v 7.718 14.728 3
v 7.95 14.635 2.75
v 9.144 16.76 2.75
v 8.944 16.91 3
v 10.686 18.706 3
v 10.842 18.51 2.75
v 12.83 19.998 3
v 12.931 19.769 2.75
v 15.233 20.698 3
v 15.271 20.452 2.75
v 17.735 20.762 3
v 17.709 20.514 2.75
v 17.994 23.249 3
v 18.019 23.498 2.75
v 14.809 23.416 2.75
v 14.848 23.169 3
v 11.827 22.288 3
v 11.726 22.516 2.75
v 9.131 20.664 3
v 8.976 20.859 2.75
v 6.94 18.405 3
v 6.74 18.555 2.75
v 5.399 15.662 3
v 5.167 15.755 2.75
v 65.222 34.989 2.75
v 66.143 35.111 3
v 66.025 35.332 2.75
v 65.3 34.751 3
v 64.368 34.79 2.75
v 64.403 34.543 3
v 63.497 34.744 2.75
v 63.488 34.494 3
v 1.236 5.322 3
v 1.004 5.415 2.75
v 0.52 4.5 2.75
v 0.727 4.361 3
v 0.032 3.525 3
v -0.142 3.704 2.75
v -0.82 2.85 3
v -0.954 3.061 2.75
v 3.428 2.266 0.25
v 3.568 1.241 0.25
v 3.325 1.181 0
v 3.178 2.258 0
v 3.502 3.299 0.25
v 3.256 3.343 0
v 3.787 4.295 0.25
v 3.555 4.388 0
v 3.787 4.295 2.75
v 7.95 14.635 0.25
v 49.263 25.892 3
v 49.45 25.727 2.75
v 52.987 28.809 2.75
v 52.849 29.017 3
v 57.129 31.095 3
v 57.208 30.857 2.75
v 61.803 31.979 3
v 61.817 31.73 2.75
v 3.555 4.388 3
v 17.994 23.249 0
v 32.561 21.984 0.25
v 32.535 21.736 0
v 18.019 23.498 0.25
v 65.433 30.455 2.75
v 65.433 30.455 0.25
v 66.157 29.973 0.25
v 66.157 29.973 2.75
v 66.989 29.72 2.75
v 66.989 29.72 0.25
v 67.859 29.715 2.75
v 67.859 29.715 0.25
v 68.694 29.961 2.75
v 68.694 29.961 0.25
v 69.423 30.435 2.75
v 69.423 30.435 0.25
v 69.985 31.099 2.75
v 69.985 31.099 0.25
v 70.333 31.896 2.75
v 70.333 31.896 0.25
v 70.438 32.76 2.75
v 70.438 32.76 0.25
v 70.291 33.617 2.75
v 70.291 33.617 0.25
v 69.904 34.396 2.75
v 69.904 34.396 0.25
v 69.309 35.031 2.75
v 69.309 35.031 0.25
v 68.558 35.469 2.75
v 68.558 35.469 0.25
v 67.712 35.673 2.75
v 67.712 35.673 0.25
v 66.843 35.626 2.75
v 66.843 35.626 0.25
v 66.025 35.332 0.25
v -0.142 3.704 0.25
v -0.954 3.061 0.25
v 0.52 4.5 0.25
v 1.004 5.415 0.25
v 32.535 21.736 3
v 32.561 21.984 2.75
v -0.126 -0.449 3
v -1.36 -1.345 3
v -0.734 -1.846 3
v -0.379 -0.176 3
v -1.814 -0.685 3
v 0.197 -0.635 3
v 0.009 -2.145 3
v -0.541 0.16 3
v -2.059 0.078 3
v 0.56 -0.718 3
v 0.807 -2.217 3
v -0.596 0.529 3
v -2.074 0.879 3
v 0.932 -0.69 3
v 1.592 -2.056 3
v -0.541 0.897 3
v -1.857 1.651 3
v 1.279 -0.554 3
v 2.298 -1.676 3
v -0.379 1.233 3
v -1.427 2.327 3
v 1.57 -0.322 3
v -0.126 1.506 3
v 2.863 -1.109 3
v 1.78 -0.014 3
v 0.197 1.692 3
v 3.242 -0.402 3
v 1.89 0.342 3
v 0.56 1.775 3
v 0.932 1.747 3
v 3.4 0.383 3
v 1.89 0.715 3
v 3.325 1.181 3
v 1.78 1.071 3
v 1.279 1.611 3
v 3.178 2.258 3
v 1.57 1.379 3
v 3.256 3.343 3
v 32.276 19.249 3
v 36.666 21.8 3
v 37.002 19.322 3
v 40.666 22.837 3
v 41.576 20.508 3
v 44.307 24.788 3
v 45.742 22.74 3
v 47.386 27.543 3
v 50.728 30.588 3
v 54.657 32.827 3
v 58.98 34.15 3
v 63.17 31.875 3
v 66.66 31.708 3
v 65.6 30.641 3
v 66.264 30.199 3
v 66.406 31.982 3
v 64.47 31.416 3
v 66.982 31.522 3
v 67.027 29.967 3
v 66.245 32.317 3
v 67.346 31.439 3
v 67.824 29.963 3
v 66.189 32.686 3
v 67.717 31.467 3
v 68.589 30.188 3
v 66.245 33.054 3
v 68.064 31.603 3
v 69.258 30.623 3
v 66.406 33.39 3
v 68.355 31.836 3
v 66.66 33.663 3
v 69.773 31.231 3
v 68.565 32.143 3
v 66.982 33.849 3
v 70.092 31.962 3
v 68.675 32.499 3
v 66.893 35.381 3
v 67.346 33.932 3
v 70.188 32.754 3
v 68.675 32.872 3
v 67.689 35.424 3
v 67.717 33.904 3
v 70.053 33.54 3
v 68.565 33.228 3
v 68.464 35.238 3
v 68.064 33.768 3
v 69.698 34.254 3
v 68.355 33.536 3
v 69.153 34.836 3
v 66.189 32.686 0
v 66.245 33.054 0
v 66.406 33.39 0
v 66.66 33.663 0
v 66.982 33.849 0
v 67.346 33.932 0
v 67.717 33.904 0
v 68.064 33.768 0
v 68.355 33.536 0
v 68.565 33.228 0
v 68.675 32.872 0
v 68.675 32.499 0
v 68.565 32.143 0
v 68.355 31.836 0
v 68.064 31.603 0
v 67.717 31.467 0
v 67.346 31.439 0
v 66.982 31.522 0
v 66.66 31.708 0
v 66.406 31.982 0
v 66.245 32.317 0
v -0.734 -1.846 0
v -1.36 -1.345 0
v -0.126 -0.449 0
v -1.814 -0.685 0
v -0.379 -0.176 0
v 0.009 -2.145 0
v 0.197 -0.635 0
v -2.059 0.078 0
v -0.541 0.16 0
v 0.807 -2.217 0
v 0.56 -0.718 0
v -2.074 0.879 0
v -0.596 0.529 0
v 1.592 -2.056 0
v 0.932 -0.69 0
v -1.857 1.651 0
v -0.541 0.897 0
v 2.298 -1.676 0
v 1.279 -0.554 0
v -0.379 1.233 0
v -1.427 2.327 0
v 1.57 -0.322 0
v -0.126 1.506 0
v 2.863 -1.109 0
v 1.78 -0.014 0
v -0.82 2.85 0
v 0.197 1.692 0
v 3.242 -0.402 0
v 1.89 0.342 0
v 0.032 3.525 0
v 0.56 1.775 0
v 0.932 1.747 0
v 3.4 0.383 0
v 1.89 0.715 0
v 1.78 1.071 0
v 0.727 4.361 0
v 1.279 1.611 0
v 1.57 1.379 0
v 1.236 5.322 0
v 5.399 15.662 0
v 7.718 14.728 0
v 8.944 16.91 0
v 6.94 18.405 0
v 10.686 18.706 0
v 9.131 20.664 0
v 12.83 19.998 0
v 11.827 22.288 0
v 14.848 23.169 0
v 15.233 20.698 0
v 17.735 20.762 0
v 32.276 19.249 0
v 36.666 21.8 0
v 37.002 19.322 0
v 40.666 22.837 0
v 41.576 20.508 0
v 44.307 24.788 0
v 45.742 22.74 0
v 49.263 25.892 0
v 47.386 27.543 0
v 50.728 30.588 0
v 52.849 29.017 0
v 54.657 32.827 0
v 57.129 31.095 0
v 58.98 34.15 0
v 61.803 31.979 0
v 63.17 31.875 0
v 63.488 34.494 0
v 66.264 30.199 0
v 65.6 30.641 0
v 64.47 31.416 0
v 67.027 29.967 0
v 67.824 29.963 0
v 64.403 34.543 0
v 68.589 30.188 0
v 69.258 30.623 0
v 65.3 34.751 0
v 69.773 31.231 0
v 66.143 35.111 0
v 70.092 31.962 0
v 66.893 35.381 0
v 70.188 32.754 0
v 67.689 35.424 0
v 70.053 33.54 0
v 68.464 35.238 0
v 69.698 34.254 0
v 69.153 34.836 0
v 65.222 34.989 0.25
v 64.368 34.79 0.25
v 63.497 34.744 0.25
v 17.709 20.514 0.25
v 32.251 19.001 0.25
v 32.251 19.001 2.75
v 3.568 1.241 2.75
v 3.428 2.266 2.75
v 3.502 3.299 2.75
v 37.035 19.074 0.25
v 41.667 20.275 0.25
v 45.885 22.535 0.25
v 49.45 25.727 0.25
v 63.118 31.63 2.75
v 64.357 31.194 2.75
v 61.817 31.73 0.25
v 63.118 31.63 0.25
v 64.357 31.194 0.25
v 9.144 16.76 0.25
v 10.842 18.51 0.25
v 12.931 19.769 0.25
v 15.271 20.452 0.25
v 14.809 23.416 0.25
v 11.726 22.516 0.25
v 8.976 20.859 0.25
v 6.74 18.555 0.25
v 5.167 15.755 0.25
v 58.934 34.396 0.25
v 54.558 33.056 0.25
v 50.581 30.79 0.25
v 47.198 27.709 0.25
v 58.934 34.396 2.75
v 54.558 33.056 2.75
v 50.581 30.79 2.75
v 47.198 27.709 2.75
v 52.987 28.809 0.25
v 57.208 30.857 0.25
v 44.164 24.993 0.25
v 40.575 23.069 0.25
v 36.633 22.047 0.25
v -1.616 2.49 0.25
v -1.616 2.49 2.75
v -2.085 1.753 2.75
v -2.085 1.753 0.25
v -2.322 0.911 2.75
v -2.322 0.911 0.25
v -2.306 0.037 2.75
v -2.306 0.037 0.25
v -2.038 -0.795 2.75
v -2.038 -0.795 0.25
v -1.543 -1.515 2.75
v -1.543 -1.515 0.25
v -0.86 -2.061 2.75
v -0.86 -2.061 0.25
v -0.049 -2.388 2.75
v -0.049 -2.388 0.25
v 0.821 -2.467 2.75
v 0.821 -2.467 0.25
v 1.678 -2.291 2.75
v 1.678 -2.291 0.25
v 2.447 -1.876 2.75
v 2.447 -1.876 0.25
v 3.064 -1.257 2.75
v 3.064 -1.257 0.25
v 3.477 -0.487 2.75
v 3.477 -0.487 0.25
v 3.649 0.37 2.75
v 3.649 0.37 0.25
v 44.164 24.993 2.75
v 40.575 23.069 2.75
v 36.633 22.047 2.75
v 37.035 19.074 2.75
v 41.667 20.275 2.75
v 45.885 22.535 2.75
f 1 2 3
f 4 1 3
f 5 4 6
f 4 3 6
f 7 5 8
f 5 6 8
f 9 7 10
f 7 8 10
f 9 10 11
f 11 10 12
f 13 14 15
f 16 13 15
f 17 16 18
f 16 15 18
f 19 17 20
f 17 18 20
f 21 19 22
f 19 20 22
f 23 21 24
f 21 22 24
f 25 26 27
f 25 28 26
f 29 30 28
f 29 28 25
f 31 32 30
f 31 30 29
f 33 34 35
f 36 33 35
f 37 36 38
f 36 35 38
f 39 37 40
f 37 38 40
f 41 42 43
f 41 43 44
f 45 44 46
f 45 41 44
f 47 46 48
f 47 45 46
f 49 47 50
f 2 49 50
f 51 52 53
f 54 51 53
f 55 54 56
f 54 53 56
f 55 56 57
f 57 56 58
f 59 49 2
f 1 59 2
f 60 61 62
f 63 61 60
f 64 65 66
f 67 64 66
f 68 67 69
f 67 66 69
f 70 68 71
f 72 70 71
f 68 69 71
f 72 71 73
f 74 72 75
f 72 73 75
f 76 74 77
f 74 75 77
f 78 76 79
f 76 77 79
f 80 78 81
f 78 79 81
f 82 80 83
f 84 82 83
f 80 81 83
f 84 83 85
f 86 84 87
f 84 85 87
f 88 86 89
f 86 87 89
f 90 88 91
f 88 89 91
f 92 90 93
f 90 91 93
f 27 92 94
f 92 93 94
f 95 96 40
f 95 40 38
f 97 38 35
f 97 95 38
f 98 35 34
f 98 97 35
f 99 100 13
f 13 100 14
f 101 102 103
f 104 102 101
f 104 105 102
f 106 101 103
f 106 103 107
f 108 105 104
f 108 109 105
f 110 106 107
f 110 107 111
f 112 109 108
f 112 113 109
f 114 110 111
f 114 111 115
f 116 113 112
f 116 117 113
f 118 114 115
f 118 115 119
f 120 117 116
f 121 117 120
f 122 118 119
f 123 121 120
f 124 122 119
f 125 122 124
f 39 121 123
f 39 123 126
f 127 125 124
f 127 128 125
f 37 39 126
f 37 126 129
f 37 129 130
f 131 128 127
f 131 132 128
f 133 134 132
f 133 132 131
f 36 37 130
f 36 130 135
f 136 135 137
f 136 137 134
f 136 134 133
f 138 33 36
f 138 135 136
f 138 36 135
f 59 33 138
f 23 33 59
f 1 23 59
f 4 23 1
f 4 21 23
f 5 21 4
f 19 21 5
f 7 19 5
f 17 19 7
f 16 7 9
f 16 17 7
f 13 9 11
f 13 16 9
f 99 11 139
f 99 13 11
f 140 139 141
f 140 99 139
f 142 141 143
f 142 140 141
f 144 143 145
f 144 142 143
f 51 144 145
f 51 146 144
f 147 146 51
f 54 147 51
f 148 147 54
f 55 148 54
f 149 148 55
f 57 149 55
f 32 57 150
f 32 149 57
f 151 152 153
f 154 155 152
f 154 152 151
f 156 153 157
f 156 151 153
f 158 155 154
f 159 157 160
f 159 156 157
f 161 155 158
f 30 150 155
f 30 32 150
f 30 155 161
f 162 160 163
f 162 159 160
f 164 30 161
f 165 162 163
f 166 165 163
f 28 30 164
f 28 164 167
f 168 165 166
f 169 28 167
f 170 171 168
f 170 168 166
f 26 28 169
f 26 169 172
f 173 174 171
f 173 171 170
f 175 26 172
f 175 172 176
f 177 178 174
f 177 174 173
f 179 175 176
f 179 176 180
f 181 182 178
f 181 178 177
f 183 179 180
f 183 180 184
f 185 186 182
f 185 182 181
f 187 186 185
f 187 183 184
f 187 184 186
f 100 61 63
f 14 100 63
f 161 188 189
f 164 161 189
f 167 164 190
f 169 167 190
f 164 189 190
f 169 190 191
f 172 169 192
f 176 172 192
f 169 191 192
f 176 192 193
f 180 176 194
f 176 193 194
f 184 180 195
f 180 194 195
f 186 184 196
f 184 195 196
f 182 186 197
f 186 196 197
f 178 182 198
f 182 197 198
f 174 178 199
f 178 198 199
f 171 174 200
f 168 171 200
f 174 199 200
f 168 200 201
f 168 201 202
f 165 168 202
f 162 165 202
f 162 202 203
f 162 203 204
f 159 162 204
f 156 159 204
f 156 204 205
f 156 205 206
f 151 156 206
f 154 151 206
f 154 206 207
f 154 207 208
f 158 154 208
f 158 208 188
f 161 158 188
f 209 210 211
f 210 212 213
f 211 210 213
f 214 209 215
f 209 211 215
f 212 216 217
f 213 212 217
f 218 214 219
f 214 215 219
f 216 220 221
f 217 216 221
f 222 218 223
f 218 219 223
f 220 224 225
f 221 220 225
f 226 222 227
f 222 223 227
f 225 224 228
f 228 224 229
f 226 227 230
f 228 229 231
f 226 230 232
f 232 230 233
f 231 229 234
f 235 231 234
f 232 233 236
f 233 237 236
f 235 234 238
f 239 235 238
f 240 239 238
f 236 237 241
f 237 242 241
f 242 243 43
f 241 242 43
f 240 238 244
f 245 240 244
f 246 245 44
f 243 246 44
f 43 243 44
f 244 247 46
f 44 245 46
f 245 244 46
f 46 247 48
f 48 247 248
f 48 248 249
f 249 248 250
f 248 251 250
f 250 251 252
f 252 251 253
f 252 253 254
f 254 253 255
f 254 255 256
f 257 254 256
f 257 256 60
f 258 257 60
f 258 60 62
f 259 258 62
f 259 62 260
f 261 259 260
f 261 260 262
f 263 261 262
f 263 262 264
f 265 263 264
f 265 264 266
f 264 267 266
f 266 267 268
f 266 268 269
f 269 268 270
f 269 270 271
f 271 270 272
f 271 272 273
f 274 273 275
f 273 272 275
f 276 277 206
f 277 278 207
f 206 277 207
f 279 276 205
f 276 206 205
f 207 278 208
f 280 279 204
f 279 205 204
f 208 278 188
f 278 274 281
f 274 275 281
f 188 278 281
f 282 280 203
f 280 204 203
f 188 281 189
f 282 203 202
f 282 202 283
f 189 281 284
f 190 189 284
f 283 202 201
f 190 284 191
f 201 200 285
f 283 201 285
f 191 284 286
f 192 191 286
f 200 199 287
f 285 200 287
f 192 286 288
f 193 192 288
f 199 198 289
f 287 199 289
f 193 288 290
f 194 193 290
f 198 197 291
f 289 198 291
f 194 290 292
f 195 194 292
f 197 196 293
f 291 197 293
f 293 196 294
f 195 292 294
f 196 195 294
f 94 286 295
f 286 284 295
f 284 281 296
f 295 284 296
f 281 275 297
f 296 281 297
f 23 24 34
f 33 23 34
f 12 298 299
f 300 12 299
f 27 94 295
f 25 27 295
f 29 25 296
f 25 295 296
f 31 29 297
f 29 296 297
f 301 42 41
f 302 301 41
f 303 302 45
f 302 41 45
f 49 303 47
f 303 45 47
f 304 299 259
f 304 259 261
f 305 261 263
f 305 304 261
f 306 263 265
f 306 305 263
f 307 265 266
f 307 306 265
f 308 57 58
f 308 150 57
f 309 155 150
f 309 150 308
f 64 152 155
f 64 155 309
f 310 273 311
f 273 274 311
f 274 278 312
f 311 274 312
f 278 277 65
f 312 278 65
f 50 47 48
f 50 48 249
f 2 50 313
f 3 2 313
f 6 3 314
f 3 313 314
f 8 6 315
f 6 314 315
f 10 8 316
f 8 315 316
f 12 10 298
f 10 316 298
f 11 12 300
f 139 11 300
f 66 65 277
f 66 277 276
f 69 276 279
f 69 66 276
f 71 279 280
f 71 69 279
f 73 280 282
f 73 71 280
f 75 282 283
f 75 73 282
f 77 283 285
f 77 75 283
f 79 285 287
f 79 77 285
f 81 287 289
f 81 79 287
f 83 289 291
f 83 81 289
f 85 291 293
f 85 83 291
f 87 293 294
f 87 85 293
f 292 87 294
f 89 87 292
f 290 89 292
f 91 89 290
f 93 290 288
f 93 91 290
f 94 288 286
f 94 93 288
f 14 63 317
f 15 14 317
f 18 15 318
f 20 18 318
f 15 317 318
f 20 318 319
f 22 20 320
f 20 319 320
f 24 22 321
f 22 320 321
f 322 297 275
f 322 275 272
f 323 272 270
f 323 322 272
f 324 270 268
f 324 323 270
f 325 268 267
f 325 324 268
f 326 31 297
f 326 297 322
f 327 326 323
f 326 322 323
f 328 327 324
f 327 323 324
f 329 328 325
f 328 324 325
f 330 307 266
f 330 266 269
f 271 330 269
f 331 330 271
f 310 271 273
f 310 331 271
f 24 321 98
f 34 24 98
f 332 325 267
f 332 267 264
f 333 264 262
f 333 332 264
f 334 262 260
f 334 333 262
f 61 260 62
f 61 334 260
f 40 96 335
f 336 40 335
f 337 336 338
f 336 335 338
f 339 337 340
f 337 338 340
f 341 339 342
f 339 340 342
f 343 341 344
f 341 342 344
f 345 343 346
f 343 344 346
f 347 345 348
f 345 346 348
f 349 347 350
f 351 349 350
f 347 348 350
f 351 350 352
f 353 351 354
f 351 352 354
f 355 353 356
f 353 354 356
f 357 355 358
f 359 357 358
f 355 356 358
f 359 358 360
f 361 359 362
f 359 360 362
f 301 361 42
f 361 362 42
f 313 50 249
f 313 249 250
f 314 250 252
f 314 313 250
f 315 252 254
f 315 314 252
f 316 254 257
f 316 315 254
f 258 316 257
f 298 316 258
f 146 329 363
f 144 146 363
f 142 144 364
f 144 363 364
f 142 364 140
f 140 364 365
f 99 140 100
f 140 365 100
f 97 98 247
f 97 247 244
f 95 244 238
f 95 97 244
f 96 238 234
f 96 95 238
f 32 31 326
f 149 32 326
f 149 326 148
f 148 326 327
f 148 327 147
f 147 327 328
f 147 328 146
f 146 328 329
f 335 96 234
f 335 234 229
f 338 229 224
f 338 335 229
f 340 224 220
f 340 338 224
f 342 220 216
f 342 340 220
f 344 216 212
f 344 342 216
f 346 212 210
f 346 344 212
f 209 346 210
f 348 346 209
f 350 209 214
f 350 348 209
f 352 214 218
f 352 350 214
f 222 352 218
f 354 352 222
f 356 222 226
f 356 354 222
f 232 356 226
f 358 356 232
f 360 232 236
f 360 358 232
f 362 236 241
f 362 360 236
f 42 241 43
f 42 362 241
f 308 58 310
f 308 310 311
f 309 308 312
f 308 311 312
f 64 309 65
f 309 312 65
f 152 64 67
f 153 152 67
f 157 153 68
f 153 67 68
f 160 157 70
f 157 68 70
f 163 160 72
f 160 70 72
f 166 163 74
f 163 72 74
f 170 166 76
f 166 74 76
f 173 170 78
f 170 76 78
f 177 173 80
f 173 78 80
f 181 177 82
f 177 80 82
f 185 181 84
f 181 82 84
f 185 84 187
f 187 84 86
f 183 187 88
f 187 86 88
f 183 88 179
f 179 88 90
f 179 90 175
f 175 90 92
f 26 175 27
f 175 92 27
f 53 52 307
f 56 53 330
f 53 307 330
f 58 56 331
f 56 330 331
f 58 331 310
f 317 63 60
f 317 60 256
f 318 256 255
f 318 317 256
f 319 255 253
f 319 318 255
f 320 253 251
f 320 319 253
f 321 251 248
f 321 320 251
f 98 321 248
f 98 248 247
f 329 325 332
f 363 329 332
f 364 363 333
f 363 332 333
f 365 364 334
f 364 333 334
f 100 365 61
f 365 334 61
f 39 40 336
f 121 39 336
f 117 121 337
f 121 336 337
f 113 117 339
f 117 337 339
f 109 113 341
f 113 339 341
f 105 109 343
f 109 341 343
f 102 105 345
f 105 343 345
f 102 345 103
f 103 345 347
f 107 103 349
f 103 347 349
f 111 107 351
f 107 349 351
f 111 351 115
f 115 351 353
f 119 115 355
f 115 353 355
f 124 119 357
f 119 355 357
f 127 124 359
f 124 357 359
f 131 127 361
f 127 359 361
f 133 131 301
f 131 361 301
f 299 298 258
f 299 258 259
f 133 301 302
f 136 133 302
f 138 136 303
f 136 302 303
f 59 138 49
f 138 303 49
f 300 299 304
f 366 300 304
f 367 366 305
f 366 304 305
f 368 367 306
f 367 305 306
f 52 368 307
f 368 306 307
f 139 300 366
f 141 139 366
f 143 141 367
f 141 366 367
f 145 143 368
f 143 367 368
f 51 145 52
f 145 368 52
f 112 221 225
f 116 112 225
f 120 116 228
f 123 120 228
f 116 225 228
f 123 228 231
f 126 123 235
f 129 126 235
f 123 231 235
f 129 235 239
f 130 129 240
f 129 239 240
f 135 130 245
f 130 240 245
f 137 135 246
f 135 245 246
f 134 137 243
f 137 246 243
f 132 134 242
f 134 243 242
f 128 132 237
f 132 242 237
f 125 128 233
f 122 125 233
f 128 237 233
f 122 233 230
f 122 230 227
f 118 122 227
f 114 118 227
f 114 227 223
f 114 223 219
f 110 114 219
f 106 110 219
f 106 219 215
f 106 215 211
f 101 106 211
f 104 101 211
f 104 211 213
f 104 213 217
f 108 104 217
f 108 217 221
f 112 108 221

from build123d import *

# Parameters (mm, degrees)
EXTRUDE_THIN1_DEPTH   = 3
SKETCH1_3_R           = 3
BOSS_EXTRUDE1_DEPTH   = 3
FILLET1_R             = 5
F_2_5MM_DOWEL_HOLE1_D = 2.5
CHAMFER1_SIZE         = 0.25


with BuildPart() as part:
    # Sketch1 → Extrude-Thin1 (new body)
    with BuildSketch(Plane.XY):
        with BuildLine():
            ThreePointArc((67.801370449, 34.141342947), (56.598136233, 33.812681852), (47.198138914, 27.708541828))
            ThreePointArc((47.198138914, 27.708541828), (40.574587763, 23.069242721), (32.560988498, 21.984460302))
            Line((32.560988498, 21.984460302), (18.0194176, 23.497567077))
            ThreePointArc((18.0194176, 23.497567077), (10.297542455, 21.776854665), (5.1667157, 15.754992513))
            Line((5.1667157, 15.754992513), (-0.737799909, 1.088733357))
            Line((-0.737799909, 1.088733357), (2.04513605, -0.031653828))
            Line((2.04513605, -0.031653828), (7.949651659, 14.634605328))
            ThreePointArc((7.949651659, 14.634605328), (11.845577871, 19.207110251), (17.7089323, 20.513677186))
            Line((17.7089323, 20.513677186), (32.250503198, 19.000570412))
            ThreePointArc((32.250503198, 19.000570412), (41.667206568, 20.275287791), (49.450477778, 25.726883522))
            ThreePointArc((49.450477778, 25.726883522), (57.492238313, 30.949016112), (67.076680067, 31.230187876))
            Line((67.076680067, 31.230187876), (67.801370449, 34.141342947))
        make_face()
    extrude(amount=EXTRUDE_THIN1_DEPTH)

    # Sketch1<3> → Boss-Extrude1 (add, through all)
    with BuildSketch(Plane.XY):
        with Locations((0.653668071, 0.528539764)):
            Circle(SKETCH1_3_R)
        with Locations((67.439025258, 32.685765412)):
            Circle(SKETCH1_3_R)
    extrude(amount=BOSS_EXTRUDE1_DEPTH)

    # Fillet1
    fillet1_edges = [part.edges().sort_by_distance(p)[0] for p in [
        (0.232483855, 3.498826595, 1.5),
        (3.015419815, 2.37843941, 1.5),
        (64.619351463, 31.661343773, 1.5),
        (65.147115394, 34.621520866, 1.5),
    ]]
    fillet(fillet1_edges, radius=FILLET1_R)

    # Ø2.5mm Dowel Hole1 (through all)
    with Locations(Plane.XY.offset(3)):
        with Locations((67.439025258, 32.685765412), (0.653668071, 0.528539764)):
            Hole(F_2_5MM_DOWEL_HOLE1_D / 2)

    # Chamfer1
    chamfer1_edges = [part.edges().sort_by_distance(p)[0] for p in [
        (10.297542455, 21.776854665, 0),
        (25.290203049, 22.741013689, 0),
        (40.574587763, 23.069242721, 0),
        (41.667206568, 20.275287791, 0),
        (24.979717749, 19.757123799, 0),
        (5.868250185, 9.464600631, 3),
        (11.845577871, 19.207110251, 0),
        (5.868250185, 9.464600631, 0),
        (3.085314225, 10.584987816, 0),
        (11.845577871, 19.207110251, 3),
        (24.979717749, 19.757123799, 3),
        (41.667206568, 20.275287791, 3),
        (40.574587763, 23.069242721, 3),
        (25.290203049, 22.741013689, 3),
        (10.297542455, 21.776854665, 3),
        (3.085314225, 10.584987816, 3),
        (55.029480027, 29.973141473, 0),
        (55.029480027, 29.973141473, 3),
        (70.417176443, 32.324357726, 0),
        (70.417176443, 32.324357726, 3),
        (54.557553661, 33.056070888, 0),
        (54.557553661, 33.056070888, 3),
        (-0.466719115, -2.254396195, 3),
        (-0.466719115, -2.254396195, 0),
        (63.752058153, 31.452795933, 3),
        (63.752058153, 31.452795933, 0),
        (64.7995305, 34.870879047, 3),
        (64.7995305, 34.870879047, 0),
        (3.437869945, 2.784750939, 0),
        (3.437869945, 2.784750939, 3),
        (0.209401135, 4.084505995, 0),
        (0.209401135, 4.084505995, 3),
    ]]
    chamfer(chamfer1_edges, length=CHAMFER1_SIZE - 0.0001)  # a hair under: the kernel refuses the full size


solid = part.part
